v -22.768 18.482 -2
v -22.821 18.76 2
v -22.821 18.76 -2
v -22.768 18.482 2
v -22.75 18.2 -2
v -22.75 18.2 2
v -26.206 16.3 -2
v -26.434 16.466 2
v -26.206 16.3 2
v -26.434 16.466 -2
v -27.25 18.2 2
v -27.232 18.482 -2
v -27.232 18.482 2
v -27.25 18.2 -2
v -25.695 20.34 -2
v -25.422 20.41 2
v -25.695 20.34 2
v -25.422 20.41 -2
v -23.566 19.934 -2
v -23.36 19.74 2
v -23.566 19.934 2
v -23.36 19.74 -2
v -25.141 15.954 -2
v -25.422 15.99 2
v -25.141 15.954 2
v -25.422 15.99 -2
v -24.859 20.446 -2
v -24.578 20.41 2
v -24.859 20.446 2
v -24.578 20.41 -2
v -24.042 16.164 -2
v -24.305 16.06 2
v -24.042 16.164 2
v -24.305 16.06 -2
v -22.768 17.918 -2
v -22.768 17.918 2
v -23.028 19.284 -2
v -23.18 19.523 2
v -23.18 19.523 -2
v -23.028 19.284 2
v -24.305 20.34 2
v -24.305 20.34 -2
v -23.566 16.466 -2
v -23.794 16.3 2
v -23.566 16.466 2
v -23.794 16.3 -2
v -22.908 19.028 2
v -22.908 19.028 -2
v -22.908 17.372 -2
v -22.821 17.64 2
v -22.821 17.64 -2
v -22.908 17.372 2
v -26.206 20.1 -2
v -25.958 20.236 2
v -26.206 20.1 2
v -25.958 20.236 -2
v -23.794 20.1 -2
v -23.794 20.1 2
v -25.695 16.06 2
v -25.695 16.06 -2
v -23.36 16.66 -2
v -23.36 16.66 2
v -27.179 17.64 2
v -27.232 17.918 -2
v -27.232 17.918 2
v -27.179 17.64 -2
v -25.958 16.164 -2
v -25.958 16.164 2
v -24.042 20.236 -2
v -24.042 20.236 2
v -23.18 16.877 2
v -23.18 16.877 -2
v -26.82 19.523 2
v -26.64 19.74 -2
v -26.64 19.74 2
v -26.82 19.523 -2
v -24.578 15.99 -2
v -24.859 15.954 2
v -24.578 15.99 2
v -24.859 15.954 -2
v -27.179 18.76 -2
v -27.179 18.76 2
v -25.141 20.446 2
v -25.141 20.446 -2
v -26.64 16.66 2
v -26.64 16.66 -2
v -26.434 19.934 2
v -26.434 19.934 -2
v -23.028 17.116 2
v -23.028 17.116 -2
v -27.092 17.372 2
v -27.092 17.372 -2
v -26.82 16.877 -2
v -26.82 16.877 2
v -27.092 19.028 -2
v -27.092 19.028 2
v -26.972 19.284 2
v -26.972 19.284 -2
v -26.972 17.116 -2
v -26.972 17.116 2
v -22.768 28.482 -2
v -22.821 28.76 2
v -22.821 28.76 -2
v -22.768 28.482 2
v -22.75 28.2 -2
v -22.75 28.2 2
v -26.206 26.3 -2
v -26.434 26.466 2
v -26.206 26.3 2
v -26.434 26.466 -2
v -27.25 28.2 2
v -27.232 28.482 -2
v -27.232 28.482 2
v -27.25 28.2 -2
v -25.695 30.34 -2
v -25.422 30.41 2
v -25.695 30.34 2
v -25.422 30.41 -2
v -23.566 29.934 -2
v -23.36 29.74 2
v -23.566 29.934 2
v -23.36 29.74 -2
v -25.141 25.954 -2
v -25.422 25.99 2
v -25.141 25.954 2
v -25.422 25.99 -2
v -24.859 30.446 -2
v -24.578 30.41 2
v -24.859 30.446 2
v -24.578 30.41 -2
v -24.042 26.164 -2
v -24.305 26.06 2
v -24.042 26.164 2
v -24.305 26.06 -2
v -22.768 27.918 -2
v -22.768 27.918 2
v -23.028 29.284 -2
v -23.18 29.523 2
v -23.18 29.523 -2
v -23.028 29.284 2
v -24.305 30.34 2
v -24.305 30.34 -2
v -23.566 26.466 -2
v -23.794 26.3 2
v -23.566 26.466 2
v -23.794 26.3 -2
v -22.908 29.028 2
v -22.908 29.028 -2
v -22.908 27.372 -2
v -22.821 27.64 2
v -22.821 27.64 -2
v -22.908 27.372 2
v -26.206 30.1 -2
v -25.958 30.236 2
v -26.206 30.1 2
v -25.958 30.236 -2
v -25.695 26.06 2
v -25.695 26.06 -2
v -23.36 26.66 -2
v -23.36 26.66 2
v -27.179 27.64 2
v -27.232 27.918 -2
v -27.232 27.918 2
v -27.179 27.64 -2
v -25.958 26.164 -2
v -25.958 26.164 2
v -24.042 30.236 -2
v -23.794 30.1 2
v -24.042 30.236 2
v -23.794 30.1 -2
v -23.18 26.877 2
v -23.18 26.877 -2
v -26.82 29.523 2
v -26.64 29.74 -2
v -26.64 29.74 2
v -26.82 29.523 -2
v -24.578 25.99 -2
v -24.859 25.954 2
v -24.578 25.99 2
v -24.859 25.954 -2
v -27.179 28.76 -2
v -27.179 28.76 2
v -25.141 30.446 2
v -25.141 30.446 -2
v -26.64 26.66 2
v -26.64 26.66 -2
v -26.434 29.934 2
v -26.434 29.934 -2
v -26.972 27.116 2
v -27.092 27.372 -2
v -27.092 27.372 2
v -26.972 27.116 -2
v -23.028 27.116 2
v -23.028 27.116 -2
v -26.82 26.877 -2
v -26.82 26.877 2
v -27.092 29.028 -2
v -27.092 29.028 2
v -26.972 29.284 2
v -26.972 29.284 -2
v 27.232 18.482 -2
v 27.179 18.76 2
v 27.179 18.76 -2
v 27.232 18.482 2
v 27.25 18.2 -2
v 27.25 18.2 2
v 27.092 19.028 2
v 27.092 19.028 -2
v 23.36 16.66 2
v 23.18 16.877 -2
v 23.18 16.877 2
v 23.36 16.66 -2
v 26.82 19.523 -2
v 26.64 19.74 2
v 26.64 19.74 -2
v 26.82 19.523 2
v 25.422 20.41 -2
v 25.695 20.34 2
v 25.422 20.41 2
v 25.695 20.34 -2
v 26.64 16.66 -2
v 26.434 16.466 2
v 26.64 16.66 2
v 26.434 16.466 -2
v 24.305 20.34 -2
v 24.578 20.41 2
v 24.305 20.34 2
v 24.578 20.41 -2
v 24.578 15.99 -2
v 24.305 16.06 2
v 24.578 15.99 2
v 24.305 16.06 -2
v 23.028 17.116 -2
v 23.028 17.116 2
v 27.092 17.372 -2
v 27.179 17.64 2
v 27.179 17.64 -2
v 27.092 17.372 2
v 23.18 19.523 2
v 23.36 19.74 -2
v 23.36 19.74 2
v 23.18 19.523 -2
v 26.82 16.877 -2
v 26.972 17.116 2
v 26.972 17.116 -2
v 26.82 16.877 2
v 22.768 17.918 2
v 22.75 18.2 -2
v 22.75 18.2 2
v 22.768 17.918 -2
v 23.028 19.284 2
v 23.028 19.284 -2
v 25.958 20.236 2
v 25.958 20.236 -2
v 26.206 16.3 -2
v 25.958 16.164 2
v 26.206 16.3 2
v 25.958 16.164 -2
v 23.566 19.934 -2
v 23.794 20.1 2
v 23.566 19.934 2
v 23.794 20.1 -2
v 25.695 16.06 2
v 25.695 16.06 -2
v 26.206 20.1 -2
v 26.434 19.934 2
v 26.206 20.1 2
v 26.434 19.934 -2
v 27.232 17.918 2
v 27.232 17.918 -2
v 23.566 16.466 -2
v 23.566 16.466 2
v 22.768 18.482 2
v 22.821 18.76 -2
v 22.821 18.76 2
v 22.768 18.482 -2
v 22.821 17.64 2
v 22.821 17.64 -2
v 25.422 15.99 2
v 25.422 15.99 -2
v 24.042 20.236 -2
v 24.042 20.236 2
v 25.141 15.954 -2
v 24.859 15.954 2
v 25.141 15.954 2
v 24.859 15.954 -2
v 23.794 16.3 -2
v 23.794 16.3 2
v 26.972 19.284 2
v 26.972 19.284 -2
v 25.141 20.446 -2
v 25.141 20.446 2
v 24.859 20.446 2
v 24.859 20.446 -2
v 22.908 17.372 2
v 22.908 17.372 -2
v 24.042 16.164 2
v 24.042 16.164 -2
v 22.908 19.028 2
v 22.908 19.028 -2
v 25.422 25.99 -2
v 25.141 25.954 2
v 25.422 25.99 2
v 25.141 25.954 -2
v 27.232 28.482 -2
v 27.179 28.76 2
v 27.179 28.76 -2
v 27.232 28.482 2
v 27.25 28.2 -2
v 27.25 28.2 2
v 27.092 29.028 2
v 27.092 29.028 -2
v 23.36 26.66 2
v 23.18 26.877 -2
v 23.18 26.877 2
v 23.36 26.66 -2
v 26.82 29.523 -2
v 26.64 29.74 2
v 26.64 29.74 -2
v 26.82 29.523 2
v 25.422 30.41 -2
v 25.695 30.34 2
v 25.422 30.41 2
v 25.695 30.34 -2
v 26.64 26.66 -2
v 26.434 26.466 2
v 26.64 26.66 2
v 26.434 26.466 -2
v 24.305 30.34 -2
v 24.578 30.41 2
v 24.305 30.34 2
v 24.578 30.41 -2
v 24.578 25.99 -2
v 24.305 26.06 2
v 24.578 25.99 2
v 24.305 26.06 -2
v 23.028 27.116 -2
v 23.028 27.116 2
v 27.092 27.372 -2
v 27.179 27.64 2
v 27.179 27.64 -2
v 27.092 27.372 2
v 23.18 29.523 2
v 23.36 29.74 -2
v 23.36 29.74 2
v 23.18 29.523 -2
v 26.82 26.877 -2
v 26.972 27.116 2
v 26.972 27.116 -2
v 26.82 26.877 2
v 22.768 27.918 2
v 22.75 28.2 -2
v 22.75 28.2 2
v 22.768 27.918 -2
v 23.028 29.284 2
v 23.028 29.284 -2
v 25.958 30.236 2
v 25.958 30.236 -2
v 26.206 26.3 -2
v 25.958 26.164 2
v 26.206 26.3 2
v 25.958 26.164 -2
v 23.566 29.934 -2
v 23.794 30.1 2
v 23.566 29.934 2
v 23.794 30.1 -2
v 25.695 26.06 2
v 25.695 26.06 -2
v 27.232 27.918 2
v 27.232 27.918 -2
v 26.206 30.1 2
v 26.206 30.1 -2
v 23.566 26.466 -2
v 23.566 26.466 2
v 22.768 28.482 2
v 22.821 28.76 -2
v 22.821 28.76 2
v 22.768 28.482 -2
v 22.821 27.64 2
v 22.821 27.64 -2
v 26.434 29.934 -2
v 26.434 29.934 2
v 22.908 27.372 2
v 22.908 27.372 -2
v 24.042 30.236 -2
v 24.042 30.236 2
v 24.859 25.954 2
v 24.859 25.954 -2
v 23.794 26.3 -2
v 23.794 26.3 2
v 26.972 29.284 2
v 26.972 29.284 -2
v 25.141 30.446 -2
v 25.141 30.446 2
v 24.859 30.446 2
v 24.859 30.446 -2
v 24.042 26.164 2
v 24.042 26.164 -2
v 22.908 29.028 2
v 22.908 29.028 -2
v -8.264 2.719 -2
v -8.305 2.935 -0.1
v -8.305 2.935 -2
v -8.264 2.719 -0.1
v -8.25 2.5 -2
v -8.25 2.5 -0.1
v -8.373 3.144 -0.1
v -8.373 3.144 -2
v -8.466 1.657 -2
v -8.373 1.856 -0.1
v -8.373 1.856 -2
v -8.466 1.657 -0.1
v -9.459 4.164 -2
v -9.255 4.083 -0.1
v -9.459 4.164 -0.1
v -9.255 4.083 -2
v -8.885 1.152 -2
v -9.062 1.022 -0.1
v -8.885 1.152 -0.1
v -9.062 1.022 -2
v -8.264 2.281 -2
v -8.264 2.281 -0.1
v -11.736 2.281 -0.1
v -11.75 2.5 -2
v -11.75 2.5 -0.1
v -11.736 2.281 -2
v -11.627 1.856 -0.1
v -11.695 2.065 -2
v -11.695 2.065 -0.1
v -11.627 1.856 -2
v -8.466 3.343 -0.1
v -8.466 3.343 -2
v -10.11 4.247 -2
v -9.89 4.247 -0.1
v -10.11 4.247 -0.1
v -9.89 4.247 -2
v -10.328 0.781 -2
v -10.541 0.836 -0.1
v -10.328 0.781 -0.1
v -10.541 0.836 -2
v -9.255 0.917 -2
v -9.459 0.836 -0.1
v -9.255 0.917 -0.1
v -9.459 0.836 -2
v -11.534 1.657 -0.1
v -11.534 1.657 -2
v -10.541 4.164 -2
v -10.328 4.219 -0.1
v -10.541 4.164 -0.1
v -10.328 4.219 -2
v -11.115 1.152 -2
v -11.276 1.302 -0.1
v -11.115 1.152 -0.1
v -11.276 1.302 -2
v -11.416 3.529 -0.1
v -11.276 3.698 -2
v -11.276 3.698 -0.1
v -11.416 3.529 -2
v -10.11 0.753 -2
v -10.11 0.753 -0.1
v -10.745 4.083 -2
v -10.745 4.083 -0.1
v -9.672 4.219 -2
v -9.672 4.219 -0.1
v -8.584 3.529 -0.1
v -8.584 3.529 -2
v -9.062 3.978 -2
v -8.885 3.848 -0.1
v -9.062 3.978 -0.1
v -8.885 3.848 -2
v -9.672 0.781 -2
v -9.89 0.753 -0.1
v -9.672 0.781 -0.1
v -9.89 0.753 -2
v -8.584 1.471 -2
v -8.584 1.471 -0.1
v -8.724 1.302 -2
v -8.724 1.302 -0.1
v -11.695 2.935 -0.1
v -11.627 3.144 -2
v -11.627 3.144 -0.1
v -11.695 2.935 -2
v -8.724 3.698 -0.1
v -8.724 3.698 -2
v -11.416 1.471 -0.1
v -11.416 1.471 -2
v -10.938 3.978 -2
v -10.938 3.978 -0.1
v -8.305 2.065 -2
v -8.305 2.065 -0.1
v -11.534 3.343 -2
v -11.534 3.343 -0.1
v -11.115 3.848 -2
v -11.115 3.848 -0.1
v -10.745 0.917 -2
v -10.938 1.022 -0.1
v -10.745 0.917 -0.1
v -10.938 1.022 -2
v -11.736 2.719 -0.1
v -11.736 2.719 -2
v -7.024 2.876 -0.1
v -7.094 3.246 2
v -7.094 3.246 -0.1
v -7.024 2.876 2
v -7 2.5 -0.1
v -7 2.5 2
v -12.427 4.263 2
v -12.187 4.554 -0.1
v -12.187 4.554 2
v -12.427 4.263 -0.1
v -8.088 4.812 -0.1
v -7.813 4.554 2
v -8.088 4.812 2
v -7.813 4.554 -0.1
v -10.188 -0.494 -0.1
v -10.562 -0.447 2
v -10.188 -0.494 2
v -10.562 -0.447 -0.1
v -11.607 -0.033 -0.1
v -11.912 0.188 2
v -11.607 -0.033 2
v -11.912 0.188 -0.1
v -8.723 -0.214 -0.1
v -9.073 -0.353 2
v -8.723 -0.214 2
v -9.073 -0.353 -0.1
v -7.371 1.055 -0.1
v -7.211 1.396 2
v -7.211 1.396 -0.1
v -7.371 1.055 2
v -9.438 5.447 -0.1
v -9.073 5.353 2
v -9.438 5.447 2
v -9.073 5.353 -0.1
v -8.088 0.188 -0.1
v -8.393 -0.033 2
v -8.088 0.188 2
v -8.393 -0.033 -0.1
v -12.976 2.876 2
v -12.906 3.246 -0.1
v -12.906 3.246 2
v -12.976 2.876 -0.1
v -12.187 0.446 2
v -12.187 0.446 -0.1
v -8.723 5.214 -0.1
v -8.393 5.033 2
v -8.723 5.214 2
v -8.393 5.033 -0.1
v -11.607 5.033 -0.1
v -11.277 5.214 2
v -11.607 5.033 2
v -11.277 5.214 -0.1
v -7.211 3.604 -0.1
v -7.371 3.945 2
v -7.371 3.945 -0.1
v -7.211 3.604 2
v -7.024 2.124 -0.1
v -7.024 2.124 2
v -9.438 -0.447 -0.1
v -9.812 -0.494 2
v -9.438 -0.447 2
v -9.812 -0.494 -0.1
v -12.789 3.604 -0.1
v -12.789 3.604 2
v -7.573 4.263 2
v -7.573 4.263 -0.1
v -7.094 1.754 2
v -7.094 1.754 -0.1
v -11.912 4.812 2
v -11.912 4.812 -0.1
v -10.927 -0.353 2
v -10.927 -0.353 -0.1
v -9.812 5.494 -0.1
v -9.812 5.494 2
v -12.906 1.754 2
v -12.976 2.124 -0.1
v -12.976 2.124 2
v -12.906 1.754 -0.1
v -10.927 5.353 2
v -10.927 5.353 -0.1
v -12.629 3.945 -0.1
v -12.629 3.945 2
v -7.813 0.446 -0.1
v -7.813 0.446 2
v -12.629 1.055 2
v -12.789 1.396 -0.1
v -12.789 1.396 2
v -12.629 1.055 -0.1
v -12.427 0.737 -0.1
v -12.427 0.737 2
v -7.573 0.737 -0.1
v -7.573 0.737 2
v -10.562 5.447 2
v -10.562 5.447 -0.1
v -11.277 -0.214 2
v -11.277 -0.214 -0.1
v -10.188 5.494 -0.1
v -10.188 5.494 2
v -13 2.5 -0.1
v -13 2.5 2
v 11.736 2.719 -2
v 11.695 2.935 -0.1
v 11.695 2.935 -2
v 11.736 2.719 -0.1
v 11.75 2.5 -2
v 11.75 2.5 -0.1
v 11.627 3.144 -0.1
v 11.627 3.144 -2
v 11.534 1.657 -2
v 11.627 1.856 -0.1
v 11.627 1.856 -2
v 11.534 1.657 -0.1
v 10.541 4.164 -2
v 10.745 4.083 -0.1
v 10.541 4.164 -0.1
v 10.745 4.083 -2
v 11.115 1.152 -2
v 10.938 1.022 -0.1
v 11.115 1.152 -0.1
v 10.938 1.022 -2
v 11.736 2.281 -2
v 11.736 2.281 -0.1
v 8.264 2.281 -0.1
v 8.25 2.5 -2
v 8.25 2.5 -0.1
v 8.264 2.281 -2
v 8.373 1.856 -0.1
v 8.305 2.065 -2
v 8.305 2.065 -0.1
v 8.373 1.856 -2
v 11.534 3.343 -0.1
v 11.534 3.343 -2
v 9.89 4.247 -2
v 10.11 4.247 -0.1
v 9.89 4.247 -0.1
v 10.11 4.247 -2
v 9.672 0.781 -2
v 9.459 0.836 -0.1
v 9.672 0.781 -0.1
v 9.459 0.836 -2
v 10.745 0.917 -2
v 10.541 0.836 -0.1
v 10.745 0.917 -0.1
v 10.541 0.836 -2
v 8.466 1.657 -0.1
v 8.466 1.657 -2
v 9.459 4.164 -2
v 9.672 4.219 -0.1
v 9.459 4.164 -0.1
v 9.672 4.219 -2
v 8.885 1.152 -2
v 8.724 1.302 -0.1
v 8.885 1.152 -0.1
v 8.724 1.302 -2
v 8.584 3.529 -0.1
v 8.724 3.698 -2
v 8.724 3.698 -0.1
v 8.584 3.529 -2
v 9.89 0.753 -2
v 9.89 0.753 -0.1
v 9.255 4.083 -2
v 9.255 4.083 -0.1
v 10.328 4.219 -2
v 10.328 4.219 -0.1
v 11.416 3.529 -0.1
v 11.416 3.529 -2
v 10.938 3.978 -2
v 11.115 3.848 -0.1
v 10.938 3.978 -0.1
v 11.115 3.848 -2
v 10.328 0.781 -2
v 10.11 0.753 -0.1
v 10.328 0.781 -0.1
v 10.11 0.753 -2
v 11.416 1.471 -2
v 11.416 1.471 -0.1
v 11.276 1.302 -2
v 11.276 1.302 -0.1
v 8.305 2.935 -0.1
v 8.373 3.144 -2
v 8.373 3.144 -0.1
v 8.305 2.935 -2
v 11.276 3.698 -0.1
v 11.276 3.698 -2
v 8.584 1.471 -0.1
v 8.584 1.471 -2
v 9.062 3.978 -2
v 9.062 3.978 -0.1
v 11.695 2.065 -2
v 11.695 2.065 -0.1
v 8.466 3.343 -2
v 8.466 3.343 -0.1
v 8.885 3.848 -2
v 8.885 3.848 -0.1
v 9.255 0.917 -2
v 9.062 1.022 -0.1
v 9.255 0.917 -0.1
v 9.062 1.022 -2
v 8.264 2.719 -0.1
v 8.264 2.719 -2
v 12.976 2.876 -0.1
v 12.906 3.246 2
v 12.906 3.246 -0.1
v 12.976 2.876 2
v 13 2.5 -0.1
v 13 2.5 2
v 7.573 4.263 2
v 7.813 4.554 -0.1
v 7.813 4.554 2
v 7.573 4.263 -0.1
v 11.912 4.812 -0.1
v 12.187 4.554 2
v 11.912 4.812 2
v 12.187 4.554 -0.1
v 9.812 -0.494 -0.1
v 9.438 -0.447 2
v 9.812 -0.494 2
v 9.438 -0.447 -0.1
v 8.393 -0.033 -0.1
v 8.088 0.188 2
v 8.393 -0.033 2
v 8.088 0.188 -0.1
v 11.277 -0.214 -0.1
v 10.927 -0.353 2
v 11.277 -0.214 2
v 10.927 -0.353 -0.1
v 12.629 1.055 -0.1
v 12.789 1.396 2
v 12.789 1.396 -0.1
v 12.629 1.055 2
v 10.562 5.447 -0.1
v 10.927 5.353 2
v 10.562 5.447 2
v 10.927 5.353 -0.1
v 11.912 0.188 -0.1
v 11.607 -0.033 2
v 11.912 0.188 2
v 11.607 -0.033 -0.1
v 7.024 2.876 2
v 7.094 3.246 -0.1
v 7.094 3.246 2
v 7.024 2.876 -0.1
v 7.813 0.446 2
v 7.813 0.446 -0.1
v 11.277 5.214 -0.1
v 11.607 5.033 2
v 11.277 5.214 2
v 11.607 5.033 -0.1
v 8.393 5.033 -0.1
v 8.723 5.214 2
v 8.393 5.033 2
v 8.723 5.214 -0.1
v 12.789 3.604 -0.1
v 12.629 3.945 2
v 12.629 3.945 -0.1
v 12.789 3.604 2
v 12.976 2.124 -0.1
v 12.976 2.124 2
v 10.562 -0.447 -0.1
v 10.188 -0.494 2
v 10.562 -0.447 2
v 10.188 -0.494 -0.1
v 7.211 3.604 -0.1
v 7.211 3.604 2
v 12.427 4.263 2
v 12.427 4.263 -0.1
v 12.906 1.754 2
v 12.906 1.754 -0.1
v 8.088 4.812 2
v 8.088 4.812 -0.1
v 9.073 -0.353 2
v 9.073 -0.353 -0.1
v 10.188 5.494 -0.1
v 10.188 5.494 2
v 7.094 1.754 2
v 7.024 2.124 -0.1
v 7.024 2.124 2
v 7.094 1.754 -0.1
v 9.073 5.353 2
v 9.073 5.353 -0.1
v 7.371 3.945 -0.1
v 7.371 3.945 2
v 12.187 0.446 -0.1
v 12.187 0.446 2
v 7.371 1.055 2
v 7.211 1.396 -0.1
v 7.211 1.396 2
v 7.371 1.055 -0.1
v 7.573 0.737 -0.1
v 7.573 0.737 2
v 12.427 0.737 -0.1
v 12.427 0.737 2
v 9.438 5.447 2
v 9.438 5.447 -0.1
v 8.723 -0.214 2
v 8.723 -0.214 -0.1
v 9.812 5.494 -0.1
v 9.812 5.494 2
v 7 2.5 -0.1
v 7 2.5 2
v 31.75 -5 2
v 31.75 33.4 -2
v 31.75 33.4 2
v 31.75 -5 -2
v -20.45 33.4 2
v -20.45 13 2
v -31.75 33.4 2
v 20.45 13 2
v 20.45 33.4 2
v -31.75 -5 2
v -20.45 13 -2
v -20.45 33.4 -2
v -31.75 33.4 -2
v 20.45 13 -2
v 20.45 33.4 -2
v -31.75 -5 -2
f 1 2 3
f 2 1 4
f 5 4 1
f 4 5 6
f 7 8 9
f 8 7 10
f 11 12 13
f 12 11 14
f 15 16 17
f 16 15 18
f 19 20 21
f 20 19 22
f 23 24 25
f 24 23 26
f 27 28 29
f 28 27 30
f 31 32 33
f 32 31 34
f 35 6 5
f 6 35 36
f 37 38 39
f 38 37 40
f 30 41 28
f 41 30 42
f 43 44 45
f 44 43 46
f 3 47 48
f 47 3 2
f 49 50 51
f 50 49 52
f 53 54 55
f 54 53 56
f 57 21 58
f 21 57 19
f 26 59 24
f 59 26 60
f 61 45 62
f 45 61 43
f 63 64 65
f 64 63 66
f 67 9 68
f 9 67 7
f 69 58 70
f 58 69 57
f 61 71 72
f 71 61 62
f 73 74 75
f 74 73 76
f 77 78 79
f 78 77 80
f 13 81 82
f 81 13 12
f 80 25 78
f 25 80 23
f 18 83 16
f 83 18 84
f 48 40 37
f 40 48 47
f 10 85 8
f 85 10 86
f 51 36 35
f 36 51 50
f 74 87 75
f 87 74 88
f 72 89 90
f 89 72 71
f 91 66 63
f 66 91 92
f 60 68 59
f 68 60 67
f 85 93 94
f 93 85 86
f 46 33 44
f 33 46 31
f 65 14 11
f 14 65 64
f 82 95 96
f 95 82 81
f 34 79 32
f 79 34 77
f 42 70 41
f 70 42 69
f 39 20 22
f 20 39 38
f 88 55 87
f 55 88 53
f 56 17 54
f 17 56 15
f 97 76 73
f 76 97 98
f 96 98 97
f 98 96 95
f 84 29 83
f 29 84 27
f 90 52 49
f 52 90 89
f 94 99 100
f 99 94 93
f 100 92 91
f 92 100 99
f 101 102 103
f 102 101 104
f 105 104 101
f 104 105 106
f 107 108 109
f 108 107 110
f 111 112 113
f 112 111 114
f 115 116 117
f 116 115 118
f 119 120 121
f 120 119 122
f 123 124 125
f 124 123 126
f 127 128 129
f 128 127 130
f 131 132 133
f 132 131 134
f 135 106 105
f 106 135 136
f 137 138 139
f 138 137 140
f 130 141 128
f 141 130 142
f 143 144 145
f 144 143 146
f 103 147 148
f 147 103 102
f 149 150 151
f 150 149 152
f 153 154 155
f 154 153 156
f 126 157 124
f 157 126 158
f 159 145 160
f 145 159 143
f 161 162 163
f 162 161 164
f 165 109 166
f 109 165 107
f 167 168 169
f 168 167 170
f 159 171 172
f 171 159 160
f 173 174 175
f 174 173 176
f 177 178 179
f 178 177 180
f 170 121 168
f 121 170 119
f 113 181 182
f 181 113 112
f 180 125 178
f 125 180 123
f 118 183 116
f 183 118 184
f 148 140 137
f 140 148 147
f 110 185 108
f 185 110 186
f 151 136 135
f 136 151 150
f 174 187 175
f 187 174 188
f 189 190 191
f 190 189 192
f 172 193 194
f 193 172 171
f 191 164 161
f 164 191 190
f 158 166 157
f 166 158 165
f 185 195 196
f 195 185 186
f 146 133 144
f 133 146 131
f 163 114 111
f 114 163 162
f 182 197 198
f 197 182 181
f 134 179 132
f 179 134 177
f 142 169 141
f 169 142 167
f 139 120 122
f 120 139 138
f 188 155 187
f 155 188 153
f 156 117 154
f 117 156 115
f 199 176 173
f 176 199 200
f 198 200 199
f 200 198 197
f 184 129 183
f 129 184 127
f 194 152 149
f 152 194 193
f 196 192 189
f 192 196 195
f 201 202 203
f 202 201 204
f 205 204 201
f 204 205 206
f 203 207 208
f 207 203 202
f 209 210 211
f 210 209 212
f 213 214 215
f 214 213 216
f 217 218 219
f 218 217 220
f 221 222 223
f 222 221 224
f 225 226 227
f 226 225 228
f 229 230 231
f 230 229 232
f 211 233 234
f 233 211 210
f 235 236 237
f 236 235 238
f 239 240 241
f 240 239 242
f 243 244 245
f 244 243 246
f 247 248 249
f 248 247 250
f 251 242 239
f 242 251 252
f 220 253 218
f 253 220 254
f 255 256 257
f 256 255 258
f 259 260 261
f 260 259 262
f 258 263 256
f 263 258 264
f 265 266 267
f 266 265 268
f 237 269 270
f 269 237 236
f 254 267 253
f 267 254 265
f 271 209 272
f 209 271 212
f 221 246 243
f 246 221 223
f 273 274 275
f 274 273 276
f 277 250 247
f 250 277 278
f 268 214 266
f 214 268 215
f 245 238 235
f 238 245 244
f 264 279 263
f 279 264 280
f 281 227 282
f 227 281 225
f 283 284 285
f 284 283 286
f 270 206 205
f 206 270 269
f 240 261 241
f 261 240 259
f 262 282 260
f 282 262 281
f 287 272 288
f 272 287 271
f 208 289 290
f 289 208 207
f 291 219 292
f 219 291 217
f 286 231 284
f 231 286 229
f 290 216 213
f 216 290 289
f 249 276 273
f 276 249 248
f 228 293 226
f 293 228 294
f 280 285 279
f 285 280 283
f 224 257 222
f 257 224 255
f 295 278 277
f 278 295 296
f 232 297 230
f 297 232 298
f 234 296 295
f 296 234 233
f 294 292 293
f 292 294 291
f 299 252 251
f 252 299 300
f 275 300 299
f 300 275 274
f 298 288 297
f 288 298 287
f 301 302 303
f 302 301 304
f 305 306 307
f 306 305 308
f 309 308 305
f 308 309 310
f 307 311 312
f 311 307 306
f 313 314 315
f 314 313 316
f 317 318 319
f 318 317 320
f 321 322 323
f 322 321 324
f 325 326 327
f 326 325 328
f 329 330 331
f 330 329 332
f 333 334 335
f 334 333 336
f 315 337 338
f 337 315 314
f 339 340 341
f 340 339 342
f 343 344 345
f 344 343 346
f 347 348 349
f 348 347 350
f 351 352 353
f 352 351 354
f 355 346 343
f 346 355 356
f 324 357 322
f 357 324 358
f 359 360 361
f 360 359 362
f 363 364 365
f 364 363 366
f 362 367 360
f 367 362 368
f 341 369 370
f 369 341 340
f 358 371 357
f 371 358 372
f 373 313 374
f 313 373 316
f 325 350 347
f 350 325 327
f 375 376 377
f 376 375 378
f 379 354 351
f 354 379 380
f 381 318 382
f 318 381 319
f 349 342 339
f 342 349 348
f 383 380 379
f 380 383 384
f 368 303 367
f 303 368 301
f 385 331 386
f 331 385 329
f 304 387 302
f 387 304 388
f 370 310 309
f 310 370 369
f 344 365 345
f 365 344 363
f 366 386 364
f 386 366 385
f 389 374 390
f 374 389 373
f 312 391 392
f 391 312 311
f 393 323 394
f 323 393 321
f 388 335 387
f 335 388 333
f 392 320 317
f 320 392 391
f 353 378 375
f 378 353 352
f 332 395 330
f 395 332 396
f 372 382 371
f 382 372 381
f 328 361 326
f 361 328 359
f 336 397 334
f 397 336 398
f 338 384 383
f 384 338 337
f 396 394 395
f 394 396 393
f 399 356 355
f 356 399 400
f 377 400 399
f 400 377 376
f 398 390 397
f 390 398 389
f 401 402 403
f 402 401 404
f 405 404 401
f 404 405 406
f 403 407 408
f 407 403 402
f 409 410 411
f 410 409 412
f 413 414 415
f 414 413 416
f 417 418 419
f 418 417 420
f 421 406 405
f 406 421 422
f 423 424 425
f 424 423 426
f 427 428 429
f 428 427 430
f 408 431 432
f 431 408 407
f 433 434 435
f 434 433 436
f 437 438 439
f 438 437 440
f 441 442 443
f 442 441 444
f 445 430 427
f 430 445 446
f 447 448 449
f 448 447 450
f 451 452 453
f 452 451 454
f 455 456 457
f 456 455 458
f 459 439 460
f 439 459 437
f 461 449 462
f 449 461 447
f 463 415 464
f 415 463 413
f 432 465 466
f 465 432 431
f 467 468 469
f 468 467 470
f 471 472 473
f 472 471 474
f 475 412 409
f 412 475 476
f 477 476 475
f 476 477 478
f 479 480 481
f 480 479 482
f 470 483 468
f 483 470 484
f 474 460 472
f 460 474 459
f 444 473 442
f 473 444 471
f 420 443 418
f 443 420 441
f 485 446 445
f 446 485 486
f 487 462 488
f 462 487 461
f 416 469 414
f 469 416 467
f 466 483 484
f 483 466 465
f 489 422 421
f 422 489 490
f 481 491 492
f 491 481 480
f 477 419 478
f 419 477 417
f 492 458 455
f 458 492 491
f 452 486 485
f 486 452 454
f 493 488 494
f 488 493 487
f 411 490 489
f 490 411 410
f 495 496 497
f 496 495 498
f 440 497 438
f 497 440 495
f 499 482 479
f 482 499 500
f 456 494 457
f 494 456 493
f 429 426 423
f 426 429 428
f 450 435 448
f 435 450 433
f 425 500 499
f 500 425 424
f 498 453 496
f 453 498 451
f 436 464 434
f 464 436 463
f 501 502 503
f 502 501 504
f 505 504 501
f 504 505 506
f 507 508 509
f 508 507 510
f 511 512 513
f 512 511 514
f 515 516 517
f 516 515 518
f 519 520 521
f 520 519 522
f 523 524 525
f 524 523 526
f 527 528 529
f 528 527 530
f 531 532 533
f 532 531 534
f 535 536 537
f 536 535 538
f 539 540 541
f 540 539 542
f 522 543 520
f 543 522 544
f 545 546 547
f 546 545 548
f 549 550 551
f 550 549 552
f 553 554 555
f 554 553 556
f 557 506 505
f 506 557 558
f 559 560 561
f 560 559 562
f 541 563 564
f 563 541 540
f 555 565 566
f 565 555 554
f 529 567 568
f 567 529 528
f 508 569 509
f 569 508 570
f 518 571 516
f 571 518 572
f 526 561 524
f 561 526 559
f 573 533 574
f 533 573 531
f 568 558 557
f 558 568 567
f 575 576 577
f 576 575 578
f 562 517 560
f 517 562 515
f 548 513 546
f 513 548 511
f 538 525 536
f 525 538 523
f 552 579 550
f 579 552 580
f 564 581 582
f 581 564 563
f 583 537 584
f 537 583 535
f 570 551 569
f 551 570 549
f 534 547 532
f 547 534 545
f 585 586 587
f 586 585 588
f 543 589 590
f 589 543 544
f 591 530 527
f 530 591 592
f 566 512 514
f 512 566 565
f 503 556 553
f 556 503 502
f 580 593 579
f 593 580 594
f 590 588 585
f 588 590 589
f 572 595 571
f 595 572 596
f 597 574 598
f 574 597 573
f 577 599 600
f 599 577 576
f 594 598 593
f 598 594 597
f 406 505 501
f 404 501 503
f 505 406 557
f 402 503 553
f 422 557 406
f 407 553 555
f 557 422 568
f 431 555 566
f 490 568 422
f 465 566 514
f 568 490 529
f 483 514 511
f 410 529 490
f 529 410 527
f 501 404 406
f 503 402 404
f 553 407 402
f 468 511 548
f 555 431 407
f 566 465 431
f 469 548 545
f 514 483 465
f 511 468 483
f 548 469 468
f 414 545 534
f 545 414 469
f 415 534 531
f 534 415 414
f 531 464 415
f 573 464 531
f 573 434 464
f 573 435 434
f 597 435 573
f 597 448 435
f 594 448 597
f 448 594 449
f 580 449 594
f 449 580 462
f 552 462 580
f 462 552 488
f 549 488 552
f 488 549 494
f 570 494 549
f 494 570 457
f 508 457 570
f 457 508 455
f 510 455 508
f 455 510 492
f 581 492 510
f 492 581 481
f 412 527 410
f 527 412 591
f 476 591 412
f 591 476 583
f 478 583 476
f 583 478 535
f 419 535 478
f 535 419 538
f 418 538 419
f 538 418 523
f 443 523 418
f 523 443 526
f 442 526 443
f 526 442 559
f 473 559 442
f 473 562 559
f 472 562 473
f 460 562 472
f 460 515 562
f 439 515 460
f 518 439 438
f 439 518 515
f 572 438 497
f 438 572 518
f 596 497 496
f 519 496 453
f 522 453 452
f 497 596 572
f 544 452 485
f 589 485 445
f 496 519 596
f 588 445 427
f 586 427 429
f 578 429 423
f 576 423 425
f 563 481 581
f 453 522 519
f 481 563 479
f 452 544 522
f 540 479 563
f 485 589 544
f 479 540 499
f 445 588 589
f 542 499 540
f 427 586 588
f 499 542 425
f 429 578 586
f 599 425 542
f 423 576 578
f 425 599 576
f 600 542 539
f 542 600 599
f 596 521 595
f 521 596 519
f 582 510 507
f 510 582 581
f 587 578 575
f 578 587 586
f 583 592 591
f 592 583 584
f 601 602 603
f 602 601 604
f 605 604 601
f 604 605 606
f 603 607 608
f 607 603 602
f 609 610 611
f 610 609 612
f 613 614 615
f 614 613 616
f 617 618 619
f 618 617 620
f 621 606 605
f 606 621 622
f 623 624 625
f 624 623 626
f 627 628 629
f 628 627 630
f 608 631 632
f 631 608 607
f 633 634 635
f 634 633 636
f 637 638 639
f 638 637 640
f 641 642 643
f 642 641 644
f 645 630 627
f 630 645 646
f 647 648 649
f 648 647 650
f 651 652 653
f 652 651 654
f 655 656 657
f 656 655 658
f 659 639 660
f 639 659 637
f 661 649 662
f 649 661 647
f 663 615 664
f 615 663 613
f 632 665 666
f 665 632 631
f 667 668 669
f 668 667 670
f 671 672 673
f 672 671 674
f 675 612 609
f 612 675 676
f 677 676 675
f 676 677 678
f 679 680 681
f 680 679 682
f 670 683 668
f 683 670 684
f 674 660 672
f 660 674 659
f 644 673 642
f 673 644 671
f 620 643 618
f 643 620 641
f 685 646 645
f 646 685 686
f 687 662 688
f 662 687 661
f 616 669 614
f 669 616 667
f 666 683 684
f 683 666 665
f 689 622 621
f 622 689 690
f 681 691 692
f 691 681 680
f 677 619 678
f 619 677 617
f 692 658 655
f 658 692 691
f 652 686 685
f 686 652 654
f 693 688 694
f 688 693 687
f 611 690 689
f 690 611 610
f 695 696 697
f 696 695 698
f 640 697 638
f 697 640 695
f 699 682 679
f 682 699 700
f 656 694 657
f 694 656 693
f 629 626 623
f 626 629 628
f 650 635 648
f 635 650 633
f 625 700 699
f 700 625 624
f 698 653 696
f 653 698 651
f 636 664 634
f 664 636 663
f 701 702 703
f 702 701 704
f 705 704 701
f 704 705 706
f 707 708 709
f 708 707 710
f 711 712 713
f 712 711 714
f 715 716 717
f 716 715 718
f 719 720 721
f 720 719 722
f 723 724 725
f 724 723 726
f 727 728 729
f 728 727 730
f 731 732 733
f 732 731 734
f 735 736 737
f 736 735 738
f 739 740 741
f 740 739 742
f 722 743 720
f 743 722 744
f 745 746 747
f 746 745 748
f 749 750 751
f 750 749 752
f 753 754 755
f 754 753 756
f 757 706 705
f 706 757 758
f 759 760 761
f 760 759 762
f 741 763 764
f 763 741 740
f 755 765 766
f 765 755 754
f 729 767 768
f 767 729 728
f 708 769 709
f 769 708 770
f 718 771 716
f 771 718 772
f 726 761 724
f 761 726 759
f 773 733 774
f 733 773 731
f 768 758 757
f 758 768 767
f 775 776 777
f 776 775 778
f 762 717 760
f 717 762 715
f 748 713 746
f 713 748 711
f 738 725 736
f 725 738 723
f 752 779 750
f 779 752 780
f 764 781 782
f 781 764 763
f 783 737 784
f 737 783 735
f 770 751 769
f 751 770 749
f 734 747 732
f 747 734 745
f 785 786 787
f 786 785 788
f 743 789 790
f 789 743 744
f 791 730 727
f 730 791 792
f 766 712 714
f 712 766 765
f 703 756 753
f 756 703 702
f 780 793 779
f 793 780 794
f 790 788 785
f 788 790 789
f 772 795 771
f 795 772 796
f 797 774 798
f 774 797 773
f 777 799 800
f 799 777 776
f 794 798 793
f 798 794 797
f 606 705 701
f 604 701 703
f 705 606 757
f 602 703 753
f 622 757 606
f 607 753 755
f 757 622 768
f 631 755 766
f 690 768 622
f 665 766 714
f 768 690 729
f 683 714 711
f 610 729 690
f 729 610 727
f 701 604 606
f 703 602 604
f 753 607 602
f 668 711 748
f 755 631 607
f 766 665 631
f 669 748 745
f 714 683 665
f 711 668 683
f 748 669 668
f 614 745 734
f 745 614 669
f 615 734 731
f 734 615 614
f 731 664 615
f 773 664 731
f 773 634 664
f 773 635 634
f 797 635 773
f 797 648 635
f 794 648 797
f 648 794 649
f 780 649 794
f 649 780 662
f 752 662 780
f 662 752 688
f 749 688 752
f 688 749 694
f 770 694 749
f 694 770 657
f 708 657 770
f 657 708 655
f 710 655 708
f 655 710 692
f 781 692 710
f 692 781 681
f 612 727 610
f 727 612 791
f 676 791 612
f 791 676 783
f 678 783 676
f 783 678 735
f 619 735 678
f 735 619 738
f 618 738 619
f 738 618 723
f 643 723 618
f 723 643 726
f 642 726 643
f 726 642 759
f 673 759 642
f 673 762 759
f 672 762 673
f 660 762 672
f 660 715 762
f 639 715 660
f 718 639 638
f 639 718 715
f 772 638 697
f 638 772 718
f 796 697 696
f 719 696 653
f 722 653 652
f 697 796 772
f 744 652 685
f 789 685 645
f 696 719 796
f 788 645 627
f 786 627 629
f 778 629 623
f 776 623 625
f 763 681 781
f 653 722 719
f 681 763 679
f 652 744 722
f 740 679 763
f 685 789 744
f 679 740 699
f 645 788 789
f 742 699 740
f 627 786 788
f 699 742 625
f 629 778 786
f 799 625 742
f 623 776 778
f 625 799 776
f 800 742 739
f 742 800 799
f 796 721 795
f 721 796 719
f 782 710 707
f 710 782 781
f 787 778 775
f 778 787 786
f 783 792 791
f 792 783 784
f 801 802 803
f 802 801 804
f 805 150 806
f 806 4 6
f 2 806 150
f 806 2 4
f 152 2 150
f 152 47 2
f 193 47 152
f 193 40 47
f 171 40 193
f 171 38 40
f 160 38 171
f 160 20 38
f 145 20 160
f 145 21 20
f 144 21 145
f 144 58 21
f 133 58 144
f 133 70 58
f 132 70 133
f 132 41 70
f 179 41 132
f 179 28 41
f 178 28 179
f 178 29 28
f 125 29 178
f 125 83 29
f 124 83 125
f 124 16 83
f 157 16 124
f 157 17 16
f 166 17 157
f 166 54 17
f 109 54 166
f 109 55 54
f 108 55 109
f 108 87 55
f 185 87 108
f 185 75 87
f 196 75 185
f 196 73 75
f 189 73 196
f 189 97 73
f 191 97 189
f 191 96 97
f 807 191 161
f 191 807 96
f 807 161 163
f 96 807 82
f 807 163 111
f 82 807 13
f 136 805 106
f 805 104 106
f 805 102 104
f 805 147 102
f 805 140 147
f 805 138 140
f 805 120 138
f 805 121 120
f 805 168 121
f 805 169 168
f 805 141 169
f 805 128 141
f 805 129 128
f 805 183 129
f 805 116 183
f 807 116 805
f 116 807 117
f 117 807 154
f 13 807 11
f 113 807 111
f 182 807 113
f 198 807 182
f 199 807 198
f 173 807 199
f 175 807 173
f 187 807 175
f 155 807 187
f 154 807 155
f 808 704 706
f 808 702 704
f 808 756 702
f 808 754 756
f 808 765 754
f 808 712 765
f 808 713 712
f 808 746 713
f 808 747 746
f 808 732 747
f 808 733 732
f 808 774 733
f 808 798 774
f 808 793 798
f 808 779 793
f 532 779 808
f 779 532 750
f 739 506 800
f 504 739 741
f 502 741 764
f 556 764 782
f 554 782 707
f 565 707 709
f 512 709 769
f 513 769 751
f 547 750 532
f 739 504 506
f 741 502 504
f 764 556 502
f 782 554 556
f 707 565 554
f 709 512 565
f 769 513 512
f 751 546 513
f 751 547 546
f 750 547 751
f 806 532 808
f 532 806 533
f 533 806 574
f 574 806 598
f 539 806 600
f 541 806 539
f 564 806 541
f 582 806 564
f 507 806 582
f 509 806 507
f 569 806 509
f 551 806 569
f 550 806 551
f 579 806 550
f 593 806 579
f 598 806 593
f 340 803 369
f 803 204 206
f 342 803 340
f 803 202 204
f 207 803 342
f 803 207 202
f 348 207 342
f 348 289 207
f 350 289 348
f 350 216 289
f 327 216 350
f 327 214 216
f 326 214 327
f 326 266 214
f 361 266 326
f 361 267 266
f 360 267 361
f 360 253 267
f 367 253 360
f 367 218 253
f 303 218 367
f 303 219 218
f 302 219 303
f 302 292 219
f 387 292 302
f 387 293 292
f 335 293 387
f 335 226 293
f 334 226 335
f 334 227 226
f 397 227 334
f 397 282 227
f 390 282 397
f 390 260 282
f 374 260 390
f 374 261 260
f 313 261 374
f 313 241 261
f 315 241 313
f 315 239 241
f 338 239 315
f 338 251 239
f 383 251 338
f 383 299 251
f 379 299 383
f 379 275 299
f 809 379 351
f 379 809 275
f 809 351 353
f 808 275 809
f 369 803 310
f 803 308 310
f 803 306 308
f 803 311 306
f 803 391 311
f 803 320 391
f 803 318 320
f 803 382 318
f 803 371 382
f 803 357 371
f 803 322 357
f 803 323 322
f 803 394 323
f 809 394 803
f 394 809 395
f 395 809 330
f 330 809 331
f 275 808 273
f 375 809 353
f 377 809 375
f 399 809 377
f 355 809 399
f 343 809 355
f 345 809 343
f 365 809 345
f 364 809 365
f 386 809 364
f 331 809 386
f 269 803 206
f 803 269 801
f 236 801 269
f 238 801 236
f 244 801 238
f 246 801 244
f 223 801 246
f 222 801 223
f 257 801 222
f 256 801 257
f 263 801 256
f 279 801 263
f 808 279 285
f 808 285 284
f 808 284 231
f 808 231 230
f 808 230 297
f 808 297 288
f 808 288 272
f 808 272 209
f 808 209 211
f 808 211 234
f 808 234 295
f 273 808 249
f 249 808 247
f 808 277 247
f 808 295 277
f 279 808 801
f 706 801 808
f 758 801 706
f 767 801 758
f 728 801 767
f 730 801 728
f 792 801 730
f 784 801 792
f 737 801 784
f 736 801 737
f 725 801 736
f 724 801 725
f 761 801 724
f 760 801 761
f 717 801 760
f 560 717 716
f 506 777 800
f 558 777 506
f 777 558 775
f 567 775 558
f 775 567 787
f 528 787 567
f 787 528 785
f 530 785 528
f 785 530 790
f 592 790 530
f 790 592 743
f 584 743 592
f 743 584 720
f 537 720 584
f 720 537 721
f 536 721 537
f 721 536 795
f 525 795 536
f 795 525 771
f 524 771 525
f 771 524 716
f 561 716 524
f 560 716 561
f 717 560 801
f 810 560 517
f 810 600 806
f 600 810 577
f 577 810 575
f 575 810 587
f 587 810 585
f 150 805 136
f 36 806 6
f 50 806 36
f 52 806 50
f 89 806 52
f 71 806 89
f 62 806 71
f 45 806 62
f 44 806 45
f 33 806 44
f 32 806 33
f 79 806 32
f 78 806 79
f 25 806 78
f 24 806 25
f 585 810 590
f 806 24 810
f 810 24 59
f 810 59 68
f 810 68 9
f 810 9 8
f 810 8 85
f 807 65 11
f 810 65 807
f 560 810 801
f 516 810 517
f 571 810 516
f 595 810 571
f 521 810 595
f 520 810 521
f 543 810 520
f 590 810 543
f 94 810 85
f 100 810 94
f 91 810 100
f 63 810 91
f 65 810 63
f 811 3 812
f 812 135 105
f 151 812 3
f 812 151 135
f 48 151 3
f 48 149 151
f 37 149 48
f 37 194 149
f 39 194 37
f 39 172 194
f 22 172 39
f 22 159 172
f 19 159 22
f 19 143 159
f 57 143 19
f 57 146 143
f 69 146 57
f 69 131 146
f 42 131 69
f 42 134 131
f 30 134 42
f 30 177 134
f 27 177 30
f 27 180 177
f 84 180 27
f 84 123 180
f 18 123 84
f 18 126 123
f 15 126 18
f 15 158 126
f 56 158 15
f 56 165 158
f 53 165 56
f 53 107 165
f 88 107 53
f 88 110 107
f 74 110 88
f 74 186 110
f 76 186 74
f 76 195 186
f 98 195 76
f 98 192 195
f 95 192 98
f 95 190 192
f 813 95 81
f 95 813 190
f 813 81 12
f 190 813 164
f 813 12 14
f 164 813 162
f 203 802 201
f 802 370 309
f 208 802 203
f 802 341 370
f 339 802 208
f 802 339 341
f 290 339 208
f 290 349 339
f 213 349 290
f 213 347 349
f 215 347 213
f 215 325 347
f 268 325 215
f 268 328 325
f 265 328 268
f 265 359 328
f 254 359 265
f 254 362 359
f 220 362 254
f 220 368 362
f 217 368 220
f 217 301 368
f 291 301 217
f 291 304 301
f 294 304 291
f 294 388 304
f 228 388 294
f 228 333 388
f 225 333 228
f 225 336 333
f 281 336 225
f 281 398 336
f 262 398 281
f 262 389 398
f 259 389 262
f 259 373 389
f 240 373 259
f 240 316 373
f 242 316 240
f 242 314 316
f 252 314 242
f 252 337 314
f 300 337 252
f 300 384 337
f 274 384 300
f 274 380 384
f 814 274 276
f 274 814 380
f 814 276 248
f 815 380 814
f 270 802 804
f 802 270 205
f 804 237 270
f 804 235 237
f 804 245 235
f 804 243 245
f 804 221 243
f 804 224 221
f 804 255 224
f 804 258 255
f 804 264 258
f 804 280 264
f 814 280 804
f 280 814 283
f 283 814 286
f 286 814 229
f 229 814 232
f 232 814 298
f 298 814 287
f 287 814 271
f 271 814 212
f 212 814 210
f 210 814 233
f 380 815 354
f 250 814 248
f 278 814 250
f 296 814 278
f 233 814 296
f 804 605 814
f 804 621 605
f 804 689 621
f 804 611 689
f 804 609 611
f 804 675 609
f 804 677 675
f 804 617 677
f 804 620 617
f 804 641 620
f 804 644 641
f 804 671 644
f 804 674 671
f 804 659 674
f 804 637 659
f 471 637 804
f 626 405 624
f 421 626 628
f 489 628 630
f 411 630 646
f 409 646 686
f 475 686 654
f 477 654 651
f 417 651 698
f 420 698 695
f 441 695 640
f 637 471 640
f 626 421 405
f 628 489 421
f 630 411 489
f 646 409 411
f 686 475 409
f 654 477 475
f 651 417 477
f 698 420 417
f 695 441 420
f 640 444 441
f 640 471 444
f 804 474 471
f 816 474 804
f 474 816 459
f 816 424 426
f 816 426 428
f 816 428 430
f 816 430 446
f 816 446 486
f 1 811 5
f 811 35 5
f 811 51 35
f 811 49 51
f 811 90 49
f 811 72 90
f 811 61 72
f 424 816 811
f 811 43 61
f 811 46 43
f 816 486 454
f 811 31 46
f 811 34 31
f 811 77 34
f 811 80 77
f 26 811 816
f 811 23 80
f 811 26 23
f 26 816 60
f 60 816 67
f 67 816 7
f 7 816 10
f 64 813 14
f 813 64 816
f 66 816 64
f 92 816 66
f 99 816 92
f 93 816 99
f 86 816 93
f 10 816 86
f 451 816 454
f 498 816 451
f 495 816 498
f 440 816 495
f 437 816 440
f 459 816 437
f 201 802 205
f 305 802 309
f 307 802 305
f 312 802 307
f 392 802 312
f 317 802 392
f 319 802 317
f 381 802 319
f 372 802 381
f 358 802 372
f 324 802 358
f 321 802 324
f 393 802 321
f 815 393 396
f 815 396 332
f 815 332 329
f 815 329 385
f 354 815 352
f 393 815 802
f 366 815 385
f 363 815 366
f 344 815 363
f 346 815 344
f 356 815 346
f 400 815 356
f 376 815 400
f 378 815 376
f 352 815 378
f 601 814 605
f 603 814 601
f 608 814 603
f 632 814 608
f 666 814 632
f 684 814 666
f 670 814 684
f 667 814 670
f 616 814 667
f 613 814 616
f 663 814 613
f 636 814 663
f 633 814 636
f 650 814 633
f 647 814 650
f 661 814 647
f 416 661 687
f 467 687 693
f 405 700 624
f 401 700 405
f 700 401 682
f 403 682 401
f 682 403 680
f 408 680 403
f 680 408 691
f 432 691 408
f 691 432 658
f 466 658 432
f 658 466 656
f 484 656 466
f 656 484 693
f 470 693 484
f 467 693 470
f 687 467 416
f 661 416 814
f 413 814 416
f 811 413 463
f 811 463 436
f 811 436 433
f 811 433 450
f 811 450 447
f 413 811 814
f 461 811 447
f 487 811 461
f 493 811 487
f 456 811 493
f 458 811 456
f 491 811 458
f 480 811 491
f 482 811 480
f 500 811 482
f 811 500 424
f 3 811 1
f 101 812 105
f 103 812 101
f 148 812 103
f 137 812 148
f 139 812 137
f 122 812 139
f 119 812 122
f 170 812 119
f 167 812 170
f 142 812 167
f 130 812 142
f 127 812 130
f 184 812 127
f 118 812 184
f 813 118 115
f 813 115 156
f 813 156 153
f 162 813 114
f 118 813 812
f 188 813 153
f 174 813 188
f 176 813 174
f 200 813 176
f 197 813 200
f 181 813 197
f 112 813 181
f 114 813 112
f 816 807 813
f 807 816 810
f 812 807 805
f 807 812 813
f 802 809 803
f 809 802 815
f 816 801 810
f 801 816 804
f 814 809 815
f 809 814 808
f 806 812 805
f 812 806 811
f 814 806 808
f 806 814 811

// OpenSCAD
/********************************************************
This file is part of the RepRapPNP project, developed at the University of Hamburg.

It heavily relies on the work by Jonas and Simon Kühling for the RepRap-Industrial design.

Author: Daniel Ahlers <2ahlers@informatik.uni-hamburg.de>
Maintainer: Florens Wasserfall <wasserfall@kalanka.de>
License: 'GNU Affero General Public License AGPLv3 http://www.gnu.org/licenses/agpl.html'
*******************************************************/

$fn=50;
// small servo (MG90S)
/*servo_width=23;
servo_height=12.5;
servo_mount_width=27.5;
servo_mount_height=0;
servo_mount_dia=3;
thick=4;
servo_clearance=1.5;
*/

// large servo (BLS451)
servo_width=40.5;
servo_height=20;
servo_mount_width=50;
servo_mount_height=5;
servo_mount_dia=4.5;
thick=4;
servo_clearance=3; // syringe: 0; pnp: 1.5

servo_mount();

module servo_mount() {
    translate([0,(servo_height+0.4)/2+20/2,0])difference(){
        translate([0,-15/2+servo_clearance/2,0])cube([max(19+servo_mount_dia*3,servo_mount_width+servo_mount_dia*3),servo_height+0.4+15+servo_clearance,thick],center=true);
        for(i=[-1,1]){
            for(j=[-1,1]){
                translate([i*servo_mount_width/2,j*servo_mount_height+servo_clearance,0])cylinder(h=thick*2,d=servo_mount_dia,center=true);
            }
        }
        for(i=[-1,1]){
            translate([i*10,-(servo_height+0.4+15)/2,0]){
                cylinder(h=thick*2,d=3.5,center=true);
                translate([0,0,(thick-2)/2])cylinder(h=2.2, r=6/2, center=true);
            }
        }
        #translate([0,servo_clearance,0])cube([servo_width+0.4,servo_height+0.4,30],center=true);
    }
}
